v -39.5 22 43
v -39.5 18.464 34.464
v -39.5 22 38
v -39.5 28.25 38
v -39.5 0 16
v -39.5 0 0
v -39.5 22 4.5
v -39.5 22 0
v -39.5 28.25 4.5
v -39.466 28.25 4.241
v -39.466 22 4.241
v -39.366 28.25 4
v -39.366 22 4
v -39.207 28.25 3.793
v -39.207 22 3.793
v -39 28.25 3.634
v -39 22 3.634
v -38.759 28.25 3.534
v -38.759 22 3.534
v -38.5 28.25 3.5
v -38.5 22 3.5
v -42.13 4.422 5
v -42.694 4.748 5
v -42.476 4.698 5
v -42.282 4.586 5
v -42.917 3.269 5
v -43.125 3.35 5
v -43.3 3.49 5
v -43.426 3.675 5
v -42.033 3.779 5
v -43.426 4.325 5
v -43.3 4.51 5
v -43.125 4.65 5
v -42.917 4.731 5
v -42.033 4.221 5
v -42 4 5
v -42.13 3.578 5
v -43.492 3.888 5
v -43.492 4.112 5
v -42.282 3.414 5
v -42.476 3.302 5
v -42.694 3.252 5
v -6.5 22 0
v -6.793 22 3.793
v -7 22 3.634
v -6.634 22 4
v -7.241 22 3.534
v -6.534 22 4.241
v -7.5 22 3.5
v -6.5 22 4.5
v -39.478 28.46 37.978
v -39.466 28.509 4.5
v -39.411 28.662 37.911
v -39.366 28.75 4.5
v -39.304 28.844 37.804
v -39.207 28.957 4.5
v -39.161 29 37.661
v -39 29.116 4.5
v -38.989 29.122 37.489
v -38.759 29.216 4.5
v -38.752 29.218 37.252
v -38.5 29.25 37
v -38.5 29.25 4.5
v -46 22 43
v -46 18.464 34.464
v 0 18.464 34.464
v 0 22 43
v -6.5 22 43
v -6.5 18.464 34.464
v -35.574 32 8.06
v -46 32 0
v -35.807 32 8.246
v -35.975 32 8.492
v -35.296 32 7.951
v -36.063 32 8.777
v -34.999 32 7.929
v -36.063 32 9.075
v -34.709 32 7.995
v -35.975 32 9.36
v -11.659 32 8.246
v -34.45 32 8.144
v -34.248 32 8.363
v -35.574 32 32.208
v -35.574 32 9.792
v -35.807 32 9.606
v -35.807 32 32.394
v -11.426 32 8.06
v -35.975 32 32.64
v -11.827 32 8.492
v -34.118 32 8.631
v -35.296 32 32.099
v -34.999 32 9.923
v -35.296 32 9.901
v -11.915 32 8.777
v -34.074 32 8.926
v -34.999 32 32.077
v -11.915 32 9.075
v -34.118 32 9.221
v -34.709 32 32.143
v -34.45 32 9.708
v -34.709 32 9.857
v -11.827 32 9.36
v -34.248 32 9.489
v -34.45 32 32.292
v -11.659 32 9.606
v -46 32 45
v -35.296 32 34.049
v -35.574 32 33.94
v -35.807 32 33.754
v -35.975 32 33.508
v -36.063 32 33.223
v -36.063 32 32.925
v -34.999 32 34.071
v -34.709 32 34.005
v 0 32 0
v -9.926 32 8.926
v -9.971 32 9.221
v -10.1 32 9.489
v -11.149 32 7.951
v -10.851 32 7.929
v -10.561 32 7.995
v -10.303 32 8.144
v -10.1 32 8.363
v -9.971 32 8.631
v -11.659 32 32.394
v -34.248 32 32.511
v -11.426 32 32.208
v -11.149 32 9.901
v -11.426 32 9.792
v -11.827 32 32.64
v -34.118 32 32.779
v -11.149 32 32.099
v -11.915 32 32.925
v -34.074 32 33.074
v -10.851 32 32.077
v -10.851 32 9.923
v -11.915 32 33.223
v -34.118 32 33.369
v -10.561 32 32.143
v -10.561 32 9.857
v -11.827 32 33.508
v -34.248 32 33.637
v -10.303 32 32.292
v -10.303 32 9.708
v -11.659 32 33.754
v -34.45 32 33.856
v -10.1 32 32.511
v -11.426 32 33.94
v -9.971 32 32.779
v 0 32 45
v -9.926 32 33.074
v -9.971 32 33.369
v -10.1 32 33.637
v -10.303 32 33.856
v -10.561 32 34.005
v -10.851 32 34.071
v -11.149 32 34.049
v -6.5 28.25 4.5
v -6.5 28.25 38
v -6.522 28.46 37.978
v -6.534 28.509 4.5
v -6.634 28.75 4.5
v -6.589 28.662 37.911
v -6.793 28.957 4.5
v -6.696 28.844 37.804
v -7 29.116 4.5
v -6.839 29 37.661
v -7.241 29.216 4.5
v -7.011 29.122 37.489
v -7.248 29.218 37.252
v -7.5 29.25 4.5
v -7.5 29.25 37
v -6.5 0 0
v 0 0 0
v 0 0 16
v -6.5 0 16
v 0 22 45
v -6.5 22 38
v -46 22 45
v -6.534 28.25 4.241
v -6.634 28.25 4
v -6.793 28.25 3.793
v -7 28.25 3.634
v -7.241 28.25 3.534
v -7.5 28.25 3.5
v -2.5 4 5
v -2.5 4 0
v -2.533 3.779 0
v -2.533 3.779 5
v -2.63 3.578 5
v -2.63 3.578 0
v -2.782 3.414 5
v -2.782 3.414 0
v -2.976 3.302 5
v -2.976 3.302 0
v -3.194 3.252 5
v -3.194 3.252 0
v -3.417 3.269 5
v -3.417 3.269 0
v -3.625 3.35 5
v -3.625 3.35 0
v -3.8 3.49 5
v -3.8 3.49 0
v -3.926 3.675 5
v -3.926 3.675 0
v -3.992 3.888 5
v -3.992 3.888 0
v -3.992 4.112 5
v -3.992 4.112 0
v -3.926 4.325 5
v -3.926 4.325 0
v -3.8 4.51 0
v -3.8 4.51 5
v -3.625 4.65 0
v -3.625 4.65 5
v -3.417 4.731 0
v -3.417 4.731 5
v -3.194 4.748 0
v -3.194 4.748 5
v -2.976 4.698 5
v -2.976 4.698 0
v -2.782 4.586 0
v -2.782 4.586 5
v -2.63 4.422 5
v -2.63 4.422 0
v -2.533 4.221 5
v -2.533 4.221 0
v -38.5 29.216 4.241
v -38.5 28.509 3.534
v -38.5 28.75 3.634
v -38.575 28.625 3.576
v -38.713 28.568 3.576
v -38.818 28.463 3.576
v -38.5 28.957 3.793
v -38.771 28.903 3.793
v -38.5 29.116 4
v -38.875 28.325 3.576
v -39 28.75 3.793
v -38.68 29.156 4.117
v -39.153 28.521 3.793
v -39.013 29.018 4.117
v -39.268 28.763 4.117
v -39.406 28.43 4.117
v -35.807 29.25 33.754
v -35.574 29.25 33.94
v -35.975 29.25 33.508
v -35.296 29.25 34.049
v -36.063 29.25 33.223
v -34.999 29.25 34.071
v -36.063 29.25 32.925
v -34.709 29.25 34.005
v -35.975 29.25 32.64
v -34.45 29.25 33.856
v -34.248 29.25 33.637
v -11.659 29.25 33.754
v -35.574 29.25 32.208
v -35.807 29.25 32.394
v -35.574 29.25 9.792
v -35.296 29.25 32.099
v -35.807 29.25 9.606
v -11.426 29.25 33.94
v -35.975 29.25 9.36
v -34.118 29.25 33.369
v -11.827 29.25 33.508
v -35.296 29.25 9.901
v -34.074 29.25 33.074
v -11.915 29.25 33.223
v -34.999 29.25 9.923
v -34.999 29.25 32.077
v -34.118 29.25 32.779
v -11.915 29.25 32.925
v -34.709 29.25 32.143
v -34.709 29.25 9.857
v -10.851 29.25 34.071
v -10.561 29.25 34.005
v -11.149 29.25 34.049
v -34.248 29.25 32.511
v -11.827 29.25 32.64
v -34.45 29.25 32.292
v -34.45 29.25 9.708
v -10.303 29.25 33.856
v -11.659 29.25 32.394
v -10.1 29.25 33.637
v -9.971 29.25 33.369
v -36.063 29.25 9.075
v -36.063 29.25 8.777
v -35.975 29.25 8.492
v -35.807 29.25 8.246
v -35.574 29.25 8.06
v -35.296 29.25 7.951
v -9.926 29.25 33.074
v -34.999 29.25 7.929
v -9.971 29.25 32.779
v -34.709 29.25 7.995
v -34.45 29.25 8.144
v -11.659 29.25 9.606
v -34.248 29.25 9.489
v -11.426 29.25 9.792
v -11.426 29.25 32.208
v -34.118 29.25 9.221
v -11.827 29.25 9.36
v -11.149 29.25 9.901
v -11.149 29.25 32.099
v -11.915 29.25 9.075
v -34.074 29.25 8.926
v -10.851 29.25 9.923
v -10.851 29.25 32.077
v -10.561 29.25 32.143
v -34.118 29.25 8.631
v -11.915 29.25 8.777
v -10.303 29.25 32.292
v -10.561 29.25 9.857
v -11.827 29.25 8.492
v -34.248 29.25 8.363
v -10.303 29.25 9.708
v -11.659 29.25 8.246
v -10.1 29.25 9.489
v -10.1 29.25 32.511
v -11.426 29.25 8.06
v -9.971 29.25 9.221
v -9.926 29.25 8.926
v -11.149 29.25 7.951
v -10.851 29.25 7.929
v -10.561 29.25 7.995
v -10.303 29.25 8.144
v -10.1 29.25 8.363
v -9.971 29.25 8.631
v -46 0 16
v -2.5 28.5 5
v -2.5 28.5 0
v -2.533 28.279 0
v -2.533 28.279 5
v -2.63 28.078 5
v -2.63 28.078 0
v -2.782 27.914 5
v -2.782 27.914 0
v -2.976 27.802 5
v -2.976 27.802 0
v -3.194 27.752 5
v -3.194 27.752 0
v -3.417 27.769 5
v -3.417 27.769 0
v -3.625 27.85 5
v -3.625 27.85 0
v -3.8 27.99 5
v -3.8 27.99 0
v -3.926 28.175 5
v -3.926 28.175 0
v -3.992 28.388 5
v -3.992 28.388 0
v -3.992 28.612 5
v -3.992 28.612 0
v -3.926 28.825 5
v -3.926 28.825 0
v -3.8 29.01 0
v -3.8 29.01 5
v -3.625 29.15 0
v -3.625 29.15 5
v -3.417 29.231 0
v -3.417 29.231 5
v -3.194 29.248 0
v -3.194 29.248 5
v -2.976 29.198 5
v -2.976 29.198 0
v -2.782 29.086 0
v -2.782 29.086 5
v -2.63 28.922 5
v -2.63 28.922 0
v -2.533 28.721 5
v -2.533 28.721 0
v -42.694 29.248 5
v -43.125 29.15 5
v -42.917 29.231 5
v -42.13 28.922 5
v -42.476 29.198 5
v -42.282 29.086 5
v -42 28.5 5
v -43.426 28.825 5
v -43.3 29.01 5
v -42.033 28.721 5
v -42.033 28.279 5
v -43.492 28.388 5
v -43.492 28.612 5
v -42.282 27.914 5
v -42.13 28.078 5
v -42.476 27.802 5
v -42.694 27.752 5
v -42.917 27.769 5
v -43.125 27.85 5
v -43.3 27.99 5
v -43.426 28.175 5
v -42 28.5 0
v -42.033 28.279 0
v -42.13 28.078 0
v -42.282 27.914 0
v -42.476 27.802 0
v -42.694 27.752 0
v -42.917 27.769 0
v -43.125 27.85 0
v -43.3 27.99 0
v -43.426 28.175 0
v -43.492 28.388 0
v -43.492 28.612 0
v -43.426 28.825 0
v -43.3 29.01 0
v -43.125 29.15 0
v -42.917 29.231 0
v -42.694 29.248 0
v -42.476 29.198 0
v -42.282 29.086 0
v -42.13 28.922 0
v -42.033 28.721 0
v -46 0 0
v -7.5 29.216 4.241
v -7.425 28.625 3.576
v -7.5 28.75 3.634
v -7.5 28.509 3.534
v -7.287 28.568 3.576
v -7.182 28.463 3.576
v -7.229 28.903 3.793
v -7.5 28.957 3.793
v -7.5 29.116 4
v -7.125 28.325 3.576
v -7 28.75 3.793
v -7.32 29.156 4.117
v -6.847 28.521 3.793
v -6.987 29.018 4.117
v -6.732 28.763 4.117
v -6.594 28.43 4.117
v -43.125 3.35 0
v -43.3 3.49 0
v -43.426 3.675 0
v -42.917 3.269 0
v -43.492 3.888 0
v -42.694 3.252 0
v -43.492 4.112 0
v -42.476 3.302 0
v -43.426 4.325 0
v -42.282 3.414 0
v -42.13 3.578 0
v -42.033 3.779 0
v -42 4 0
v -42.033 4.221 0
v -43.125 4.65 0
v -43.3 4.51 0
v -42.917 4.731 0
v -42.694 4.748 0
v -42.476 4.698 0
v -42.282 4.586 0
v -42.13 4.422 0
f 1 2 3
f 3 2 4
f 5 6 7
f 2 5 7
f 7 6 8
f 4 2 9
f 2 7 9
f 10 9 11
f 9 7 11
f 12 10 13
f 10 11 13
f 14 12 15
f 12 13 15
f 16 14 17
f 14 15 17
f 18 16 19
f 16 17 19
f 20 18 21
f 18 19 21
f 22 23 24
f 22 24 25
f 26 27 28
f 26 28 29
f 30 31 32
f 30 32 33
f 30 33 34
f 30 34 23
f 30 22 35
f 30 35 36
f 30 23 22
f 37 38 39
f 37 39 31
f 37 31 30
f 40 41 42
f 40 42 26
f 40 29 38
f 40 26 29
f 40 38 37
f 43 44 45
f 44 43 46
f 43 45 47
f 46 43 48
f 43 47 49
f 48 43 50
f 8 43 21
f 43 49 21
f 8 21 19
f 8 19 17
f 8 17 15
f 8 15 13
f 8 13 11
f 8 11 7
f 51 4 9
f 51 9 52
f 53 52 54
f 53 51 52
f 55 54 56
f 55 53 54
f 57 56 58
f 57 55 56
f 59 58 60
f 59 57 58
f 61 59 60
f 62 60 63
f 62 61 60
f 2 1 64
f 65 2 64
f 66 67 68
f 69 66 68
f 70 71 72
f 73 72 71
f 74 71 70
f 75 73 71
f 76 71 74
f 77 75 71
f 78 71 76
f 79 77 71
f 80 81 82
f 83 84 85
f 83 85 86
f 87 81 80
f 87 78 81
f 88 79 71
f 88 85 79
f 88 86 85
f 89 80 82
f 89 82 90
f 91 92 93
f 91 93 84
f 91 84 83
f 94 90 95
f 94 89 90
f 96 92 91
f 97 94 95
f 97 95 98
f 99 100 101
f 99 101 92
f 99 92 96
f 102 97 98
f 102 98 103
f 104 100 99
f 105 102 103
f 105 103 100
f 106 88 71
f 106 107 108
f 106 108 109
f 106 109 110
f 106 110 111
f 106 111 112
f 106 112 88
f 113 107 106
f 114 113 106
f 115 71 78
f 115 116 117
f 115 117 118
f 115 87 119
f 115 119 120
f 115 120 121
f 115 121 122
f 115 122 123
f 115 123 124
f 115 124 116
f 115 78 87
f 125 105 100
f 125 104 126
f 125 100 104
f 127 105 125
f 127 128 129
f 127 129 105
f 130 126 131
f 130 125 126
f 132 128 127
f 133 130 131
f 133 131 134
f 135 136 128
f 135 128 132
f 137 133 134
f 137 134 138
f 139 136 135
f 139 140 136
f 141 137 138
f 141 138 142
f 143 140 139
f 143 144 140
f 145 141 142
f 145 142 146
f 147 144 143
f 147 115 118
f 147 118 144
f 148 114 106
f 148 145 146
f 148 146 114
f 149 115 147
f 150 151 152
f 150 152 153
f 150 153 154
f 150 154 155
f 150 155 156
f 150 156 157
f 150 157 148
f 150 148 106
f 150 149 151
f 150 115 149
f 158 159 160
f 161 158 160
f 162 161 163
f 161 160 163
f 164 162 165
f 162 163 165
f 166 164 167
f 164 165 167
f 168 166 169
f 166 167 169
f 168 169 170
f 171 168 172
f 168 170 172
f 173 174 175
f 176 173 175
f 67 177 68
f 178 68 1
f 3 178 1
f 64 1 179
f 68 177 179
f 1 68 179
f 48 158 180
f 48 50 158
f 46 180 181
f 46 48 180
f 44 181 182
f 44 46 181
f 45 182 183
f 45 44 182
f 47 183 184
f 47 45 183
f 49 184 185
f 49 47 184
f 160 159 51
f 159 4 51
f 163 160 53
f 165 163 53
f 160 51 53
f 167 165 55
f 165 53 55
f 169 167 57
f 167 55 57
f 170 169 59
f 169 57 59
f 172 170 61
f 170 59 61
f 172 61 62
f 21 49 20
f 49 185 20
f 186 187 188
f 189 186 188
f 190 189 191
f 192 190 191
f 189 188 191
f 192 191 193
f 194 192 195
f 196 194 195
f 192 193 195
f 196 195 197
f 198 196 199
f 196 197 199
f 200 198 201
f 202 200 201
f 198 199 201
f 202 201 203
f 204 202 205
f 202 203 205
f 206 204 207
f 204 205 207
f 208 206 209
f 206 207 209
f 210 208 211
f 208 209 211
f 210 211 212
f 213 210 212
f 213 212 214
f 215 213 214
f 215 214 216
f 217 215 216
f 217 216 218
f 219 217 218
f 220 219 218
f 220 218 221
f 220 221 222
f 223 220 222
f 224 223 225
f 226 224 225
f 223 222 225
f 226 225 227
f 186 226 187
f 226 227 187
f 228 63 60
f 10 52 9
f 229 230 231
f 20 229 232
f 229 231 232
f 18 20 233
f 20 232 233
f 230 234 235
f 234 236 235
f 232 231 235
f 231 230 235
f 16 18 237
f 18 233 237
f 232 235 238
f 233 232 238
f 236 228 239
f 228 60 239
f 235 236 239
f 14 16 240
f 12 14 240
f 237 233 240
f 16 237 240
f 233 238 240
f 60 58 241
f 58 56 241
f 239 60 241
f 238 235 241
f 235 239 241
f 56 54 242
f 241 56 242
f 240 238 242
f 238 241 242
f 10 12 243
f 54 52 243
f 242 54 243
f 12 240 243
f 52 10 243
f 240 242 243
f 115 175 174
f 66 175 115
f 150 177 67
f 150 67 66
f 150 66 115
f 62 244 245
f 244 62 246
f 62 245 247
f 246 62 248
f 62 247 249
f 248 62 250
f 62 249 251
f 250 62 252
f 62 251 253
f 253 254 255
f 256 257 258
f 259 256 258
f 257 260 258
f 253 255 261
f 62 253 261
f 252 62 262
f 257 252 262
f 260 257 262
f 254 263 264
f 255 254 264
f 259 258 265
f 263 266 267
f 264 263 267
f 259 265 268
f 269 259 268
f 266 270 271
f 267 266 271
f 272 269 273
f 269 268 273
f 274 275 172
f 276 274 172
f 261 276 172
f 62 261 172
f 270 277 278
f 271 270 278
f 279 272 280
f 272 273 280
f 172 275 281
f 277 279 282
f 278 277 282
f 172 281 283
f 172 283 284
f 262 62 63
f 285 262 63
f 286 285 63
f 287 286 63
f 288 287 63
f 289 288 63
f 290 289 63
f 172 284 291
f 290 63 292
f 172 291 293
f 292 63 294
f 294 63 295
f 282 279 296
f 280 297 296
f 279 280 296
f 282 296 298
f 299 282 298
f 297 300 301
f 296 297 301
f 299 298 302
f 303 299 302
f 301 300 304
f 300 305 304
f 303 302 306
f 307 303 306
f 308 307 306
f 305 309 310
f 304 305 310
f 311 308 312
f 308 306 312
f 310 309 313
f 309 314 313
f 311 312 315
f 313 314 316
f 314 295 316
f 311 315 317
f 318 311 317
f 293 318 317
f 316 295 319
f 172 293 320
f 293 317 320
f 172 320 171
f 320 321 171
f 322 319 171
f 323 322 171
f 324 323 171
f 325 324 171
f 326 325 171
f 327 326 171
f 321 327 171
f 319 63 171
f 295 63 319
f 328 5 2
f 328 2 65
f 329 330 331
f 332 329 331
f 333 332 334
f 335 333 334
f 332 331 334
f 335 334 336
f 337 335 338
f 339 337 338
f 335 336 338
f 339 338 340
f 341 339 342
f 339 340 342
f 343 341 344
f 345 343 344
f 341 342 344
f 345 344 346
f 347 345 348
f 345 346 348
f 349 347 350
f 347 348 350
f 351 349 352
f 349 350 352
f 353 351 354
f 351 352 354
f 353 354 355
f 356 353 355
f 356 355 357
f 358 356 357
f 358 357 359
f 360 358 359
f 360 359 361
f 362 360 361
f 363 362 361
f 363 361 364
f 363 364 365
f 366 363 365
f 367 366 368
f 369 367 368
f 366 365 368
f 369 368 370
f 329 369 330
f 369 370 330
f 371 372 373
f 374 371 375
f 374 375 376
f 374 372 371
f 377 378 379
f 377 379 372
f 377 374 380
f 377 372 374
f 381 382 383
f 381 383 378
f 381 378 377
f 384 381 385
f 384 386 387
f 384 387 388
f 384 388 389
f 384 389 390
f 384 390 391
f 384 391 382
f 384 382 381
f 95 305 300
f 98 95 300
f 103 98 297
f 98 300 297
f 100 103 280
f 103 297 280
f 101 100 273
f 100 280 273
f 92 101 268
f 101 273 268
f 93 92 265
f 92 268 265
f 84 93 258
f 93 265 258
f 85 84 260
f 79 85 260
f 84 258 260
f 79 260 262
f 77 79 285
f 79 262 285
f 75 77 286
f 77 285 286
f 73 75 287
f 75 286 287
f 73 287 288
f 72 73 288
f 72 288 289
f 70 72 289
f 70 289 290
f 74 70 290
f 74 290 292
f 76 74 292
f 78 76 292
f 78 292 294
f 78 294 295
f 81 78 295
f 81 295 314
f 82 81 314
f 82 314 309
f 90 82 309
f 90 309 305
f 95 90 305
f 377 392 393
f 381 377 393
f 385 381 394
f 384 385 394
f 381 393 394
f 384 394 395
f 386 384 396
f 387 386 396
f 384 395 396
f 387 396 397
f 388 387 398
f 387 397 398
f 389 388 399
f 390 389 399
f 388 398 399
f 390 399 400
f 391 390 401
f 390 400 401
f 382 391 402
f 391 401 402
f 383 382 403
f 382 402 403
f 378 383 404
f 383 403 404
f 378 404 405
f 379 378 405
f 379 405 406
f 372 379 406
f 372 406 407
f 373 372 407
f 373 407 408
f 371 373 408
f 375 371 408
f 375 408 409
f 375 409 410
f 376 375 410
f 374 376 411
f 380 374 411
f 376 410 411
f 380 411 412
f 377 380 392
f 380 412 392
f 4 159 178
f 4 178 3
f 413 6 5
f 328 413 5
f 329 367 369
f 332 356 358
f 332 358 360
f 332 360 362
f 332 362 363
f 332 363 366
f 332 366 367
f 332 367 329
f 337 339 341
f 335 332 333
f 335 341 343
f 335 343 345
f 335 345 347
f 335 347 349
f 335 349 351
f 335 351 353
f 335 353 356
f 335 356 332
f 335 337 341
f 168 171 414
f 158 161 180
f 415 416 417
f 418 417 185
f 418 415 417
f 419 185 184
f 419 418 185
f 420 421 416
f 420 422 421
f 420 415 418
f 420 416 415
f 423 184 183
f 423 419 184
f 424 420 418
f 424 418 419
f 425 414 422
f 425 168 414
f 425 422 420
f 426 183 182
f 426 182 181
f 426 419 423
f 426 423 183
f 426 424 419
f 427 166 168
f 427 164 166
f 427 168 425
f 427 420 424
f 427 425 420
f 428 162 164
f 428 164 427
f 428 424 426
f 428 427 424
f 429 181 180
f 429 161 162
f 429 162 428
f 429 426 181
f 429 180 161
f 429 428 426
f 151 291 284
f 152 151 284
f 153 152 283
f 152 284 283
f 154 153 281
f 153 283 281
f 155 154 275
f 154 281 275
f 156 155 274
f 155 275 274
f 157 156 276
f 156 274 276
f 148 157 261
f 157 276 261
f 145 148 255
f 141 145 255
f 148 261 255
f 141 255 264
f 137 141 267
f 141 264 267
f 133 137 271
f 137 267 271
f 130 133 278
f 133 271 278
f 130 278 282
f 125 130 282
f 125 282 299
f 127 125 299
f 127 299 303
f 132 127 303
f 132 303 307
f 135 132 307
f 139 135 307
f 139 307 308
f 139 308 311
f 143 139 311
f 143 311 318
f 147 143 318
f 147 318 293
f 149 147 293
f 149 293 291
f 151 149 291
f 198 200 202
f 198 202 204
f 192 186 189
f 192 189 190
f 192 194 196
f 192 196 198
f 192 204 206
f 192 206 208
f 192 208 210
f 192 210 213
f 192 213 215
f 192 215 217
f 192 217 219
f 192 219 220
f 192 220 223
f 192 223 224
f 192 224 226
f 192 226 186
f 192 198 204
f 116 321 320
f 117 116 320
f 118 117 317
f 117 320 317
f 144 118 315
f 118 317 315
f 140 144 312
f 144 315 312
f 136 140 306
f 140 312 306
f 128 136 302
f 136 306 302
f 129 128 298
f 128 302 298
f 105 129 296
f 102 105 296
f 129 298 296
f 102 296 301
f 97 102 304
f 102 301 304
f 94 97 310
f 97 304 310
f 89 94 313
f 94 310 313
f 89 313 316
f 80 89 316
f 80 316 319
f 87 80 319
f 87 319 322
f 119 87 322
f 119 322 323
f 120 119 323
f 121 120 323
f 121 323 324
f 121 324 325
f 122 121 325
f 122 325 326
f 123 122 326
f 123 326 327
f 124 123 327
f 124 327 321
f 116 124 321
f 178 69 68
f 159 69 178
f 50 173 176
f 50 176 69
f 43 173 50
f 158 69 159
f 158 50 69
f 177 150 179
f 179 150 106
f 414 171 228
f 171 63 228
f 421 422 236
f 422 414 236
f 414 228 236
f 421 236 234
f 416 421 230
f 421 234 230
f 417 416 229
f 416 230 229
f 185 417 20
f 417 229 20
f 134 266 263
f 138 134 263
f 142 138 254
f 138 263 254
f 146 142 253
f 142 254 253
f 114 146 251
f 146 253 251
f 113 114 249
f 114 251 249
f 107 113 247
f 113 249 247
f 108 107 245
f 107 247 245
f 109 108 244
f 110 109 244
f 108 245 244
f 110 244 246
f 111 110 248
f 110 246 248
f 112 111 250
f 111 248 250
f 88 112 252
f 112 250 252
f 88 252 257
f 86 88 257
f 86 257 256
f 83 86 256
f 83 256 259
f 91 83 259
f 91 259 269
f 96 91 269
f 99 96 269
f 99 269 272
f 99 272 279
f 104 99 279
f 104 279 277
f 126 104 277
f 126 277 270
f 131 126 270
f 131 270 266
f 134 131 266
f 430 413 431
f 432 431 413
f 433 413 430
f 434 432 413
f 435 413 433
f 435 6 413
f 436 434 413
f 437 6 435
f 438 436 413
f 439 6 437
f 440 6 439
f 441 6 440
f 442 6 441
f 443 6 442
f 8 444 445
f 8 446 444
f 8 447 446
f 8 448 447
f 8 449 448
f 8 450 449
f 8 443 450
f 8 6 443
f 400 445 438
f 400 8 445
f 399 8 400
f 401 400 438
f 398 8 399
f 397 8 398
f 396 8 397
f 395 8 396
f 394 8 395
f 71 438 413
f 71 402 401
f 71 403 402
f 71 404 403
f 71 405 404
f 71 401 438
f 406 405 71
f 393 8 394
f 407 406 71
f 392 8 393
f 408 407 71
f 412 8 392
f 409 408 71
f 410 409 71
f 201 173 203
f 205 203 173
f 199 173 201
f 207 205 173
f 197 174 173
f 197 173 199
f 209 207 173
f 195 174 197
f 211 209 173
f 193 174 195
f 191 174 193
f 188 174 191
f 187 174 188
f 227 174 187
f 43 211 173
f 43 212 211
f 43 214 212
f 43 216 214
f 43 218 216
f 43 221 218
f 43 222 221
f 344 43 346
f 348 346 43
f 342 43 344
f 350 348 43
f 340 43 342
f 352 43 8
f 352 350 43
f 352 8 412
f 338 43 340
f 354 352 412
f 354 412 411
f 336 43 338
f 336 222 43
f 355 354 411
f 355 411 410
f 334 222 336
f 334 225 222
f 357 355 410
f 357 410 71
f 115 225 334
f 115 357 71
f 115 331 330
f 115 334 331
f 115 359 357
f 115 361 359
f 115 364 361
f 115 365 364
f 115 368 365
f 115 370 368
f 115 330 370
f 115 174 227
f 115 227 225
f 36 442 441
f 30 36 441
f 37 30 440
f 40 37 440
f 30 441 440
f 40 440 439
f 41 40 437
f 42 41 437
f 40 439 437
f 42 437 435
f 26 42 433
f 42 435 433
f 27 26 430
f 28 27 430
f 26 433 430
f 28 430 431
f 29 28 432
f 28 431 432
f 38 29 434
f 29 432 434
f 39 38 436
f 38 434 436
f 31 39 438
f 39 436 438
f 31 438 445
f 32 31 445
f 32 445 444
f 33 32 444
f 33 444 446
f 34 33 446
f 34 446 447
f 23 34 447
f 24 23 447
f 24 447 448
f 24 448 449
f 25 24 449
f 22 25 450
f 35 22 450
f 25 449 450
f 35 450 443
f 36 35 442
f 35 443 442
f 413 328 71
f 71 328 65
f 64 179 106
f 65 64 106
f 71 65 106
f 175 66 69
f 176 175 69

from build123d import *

# Parameters (mm, degrees)
F0_W      = 32
F0_H      = 42
F1_DEPTH  = 46
F2_W      = 33
F2_H      = 29.25
F3_DEPTH  = 42.001
F4_SIZE   = 26
F5_R      = 1
F6_DEPTH  = 25
F7_W      = 46
F7_H      = 7
F7_H_2    = 3.5
F8_DEPTH  = 10
F9_SIZE   = 5
F10_R     = 1
F11_R     = 0.75
F12_DEPTH = 5


with BuildPart() as f1:
    # F0 (on Right) → F1 (new body)
    with BuildSketch(Plane.YZ):
        with Locations((16, 21)):
            Rectangle(F0_W, F0_H)
    extrude(amount=-F1_DEPTH)

    # F2 (on Top) → F3 (cut, through all)
    with BuildSketch(Plane.XY):
        with Locations((-23, 14.625)):
            Rectangle(F2_W, F2_H)
    extrude(amount=F3_DEPTH, mode=Mode.SUBTRACT)

    # F4
    f4_edges = [f1.edges().sort_by_distance(p)[0] for p in [
        (-42.75, 0, 42),
        (-3.25, 0, 42),
    ]]
    chamfer(f4_edges, length=F4_SIZE)

    # F5 (on face) → F6 (cut)
    with BuildSketch(Plane.XZ.offset(-29.25)):
        with Locations((-35.0738482888, 33.0738482888)):
            Circle(F5_R)
        with Locations((-10.9261517112, 33.0738482888)):
            Circle(F5_R)
        with Locations((-35.0738482888, 8.9261517112)):
            Circle(F5_R)
        with Locations((-10.9261517112, 8.9261517112)):
            Circle(F5_R)
    extrude(amount=-F6_DEPTH, mode=Mode.SUBTRACT)

    # F7 (on face) → F8 (join)
    with BuildSketch(Plane(origin=(0, 32, 0), x_dir=(-1, 0, 0), z_dir=(0, 1, 0))):
        with Locations((23, 41.5)):
            Rectangle(F7_W, F7_H)
        with Locations((23, 1.75)):
            Rectangle(F7_W, F7_H_2)
    extrude(amount=-F8_DEPTH)

    # F9
    f9_edges = [f1.edges().sort_by_distance(p)[0] for p in [
        (-42.75, 22, 38),
        (-3.25, 22, 38),
    ]]
    chamfer(f9_edges, length=F9_SIZE)

    # F10
    f10_edges = [f1.edges().sort_by_distance(p)[0] for p in [
        (-39.5, 29.25, 20.75),
        (-6.5, 29.25, 20.75),
        (-23, 29.25, 38),
        (-23, 29.25, 3.5),
        (-39.5, 25.625, 3.5),
        (-6.5, 25.625, 3.5),
    ]]
    fillet(f10_edges, radius=F10_R)

    # F11 (on face) → F12 (cut)
    with BuildSketch(Plane(origin=(0, 0, 0), x_dir=(1, 0, 0), z_dir=(0, 0, -1))):
        with Locations((-42.75, -4)):
            Circle(F11_R)
        with Locations((-42.75, -28.5)):
            Circle(F11_R)
        with Locations((-3.25, -28.5)):
            Circle(F11_R)
        with Locations((-3.25, -4)):
            Circle(F11_R)
    extrude(amount=-F12_DEPTH, mode=Mode.SUBTRACT)


solid = f1.part
